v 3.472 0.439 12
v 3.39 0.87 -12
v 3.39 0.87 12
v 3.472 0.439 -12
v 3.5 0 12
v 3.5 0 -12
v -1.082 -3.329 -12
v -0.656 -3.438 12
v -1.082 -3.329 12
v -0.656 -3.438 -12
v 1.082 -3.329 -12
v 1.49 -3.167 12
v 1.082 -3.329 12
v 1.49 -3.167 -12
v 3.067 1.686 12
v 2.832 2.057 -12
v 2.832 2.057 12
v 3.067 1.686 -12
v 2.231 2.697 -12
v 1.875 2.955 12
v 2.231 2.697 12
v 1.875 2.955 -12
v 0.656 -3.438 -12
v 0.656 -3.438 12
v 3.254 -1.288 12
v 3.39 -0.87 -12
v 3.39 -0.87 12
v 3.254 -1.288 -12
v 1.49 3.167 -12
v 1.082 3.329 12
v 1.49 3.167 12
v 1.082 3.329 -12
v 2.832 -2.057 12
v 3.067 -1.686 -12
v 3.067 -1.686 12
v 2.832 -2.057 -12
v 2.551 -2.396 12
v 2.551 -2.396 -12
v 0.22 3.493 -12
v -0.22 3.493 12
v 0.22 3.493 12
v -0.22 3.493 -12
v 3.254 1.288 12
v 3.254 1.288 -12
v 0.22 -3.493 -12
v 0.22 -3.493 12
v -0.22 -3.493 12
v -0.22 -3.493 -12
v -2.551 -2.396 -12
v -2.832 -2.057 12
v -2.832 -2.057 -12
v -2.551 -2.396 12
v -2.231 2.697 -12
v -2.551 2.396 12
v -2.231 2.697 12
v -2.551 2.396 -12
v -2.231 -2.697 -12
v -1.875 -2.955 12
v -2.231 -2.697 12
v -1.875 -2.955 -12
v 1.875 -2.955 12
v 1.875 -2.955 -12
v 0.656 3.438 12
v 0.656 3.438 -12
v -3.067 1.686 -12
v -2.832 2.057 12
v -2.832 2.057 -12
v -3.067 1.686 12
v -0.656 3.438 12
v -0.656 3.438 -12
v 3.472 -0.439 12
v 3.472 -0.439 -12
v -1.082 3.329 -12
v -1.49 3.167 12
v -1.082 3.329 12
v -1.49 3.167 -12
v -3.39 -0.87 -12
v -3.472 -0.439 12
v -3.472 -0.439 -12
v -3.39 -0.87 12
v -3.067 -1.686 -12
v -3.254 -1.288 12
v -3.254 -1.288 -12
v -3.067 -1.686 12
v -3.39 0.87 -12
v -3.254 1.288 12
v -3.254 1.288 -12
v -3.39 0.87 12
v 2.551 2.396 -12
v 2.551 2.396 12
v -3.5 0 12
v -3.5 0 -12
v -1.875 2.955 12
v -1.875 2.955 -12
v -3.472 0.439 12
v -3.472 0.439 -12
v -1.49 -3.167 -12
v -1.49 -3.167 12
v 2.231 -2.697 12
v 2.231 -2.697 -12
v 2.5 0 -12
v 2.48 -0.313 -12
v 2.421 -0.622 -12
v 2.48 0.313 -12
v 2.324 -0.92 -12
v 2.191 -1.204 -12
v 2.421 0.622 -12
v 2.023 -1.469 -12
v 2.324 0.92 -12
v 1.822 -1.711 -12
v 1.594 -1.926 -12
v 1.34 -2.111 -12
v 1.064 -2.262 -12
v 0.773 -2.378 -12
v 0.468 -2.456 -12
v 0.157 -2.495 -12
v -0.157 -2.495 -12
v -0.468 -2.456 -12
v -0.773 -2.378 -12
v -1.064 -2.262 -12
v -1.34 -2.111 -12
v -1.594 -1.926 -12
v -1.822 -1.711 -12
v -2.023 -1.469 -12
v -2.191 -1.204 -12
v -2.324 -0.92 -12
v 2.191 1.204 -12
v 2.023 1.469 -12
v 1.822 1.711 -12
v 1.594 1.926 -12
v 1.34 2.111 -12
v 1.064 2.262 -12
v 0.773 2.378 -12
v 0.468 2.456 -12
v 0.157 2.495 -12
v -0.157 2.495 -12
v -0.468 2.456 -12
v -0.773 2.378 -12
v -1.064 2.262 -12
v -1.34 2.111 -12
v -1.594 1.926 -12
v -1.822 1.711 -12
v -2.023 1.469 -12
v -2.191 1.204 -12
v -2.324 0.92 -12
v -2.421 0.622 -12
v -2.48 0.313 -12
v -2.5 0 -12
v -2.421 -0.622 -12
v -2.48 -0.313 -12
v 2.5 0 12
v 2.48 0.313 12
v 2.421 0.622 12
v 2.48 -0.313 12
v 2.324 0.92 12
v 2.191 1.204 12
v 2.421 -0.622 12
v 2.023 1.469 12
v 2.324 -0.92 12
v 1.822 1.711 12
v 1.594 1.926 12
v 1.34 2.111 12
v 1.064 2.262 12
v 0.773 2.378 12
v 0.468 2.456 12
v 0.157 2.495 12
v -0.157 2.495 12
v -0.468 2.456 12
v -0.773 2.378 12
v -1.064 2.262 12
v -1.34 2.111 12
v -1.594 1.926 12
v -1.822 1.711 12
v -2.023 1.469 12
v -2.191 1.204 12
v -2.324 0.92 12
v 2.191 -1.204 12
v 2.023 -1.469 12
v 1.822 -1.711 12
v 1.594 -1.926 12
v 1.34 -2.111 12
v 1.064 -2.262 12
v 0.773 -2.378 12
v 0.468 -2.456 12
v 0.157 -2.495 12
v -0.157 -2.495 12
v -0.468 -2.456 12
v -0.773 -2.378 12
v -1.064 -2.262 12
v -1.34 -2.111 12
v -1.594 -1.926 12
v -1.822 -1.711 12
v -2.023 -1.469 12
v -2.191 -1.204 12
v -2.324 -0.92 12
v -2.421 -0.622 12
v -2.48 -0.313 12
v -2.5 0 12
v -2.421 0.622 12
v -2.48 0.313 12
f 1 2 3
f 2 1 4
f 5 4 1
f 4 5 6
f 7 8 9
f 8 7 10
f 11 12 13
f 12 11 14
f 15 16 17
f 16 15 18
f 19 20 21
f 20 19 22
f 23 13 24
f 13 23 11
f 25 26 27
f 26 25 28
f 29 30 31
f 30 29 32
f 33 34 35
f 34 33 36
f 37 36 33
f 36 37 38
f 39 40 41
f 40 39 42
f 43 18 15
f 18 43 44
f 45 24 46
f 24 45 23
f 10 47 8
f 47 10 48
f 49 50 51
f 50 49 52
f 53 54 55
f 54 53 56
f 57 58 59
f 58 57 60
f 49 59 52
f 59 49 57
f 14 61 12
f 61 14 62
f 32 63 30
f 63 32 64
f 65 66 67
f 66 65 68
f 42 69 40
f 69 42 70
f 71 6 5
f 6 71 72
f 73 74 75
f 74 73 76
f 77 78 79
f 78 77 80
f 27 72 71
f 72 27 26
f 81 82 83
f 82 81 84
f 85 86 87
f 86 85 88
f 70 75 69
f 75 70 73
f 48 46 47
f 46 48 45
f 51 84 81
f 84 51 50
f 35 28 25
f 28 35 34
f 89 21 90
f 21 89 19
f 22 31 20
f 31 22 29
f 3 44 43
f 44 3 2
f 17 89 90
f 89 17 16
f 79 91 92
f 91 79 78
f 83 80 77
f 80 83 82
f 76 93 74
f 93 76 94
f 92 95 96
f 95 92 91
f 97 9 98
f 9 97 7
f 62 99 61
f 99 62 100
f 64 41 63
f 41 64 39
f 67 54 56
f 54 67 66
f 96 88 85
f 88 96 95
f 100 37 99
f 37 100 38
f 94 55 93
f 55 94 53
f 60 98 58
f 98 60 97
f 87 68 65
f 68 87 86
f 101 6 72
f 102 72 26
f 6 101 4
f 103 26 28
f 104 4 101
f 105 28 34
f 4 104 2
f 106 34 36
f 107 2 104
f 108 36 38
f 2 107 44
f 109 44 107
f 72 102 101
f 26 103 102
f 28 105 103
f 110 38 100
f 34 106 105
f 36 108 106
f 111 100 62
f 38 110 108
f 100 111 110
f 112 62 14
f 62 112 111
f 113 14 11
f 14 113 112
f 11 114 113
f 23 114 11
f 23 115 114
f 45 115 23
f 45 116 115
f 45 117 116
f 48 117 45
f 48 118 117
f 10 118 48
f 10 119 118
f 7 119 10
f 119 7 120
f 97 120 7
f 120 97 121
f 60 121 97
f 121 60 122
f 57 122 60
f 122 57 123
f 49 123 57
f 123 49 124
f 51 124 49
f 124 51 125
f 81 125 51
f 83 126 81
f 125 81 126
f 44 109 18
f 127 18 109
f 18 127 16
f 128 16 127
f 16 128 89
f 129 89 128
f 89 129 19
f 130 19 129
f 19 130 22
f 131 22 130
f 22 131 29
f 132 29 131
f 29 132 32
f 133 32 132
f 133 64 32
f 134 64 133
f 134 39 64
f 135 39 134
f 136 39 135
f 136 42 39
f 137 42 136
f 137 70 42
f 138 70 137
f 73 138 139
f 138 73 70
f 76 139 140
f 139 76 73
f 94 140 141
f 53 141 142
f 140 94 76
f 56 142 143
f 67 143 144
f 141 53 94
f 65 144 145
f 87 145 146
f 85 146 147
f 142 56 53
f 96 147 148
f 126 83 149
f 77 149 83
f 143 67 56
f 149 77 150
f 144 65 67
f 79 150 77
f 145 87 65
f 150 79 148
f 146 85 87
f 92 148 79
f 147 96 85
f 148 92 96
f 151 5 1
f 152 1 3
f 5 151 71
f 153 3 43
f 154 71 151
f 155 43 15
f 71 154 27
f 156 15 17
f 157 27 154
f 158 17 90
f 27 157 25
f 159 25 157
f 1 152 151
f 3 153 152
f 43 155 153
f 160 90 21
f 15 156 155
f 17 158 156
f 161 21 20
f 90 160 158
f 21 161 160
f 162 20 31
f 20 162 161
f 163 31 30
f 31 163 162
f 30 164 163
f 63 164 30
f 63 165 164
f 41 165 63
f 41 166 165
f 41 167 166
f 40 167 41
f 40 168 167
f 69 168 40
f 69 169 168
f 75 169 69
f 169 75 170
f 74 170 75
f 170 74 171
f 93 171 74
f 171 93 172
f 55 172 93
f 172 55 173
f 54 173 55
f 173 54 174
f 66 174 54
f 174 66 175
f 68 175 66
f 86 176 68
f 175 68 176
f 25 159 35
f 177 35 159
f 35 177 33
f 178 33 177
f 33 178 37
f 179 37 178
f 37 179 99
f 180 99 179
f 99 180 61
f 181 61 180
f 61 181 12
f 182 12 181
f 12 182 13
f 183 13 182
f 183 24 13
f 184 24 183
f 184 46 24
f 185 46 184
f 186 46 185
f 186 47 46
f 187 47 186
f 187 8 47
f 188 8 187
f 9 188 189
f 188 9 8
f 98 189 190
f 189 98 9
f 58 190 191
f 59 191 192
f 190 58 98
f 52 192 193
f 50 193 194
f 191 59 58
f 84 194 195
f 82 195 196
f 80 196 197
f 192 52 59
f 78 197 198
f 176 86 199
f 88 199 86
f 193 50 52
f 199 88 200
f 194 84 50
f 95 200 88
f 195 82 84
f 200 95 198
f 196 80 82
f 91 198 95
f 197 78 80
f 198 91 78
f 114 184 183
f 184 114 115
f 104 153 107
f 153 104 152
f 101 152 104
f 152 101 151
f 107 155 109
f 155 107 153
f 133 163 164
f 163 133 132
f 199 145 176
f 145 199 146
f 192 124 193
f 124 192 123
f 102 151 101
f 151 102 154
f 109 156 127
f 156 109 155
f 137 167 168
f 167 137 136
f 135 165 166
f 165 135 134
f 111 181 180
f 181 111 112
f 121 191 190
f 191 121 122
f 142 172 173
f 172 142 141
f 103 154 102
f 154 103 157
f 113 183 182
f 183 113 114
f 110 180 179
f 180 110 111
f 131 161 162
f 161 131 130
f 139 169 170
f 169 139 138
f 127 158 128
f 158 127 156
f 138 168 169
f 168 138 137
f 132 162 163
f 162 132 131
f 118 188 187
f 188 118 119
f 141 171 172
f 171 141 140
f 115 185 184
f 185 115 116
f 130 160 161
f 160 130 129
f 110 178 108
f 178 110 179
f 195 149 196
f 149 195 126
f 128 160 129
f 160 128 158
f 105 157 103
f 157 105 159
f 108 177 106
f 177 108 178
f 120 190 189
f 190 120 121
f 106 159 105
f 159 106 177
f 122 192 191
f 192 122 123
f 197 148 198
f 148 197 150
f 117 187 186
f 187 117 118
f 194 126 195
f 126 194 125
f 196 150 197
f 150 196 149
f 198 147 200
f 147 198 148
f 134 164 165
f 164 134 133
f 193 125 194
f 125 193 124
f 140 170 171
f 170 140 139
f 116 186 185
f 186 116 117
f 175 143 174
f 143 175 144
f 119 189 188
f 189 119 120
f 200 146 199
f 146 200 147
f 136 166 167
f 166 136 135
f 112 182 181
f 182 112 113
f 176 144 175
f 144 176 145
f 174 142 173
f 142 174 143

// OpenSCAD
$fn = 50;


difference() {
	union() {
		translate(v = [0, 0, -12.0000000000]) {
			cylinder(h = 24, r = 3.5000000000);
		}
	}
	union() {
		translate(v = [0, 0, -100.0000000000]) {
			cylinder(h = 200, r = 2.5000000000);
		}
	}
}
